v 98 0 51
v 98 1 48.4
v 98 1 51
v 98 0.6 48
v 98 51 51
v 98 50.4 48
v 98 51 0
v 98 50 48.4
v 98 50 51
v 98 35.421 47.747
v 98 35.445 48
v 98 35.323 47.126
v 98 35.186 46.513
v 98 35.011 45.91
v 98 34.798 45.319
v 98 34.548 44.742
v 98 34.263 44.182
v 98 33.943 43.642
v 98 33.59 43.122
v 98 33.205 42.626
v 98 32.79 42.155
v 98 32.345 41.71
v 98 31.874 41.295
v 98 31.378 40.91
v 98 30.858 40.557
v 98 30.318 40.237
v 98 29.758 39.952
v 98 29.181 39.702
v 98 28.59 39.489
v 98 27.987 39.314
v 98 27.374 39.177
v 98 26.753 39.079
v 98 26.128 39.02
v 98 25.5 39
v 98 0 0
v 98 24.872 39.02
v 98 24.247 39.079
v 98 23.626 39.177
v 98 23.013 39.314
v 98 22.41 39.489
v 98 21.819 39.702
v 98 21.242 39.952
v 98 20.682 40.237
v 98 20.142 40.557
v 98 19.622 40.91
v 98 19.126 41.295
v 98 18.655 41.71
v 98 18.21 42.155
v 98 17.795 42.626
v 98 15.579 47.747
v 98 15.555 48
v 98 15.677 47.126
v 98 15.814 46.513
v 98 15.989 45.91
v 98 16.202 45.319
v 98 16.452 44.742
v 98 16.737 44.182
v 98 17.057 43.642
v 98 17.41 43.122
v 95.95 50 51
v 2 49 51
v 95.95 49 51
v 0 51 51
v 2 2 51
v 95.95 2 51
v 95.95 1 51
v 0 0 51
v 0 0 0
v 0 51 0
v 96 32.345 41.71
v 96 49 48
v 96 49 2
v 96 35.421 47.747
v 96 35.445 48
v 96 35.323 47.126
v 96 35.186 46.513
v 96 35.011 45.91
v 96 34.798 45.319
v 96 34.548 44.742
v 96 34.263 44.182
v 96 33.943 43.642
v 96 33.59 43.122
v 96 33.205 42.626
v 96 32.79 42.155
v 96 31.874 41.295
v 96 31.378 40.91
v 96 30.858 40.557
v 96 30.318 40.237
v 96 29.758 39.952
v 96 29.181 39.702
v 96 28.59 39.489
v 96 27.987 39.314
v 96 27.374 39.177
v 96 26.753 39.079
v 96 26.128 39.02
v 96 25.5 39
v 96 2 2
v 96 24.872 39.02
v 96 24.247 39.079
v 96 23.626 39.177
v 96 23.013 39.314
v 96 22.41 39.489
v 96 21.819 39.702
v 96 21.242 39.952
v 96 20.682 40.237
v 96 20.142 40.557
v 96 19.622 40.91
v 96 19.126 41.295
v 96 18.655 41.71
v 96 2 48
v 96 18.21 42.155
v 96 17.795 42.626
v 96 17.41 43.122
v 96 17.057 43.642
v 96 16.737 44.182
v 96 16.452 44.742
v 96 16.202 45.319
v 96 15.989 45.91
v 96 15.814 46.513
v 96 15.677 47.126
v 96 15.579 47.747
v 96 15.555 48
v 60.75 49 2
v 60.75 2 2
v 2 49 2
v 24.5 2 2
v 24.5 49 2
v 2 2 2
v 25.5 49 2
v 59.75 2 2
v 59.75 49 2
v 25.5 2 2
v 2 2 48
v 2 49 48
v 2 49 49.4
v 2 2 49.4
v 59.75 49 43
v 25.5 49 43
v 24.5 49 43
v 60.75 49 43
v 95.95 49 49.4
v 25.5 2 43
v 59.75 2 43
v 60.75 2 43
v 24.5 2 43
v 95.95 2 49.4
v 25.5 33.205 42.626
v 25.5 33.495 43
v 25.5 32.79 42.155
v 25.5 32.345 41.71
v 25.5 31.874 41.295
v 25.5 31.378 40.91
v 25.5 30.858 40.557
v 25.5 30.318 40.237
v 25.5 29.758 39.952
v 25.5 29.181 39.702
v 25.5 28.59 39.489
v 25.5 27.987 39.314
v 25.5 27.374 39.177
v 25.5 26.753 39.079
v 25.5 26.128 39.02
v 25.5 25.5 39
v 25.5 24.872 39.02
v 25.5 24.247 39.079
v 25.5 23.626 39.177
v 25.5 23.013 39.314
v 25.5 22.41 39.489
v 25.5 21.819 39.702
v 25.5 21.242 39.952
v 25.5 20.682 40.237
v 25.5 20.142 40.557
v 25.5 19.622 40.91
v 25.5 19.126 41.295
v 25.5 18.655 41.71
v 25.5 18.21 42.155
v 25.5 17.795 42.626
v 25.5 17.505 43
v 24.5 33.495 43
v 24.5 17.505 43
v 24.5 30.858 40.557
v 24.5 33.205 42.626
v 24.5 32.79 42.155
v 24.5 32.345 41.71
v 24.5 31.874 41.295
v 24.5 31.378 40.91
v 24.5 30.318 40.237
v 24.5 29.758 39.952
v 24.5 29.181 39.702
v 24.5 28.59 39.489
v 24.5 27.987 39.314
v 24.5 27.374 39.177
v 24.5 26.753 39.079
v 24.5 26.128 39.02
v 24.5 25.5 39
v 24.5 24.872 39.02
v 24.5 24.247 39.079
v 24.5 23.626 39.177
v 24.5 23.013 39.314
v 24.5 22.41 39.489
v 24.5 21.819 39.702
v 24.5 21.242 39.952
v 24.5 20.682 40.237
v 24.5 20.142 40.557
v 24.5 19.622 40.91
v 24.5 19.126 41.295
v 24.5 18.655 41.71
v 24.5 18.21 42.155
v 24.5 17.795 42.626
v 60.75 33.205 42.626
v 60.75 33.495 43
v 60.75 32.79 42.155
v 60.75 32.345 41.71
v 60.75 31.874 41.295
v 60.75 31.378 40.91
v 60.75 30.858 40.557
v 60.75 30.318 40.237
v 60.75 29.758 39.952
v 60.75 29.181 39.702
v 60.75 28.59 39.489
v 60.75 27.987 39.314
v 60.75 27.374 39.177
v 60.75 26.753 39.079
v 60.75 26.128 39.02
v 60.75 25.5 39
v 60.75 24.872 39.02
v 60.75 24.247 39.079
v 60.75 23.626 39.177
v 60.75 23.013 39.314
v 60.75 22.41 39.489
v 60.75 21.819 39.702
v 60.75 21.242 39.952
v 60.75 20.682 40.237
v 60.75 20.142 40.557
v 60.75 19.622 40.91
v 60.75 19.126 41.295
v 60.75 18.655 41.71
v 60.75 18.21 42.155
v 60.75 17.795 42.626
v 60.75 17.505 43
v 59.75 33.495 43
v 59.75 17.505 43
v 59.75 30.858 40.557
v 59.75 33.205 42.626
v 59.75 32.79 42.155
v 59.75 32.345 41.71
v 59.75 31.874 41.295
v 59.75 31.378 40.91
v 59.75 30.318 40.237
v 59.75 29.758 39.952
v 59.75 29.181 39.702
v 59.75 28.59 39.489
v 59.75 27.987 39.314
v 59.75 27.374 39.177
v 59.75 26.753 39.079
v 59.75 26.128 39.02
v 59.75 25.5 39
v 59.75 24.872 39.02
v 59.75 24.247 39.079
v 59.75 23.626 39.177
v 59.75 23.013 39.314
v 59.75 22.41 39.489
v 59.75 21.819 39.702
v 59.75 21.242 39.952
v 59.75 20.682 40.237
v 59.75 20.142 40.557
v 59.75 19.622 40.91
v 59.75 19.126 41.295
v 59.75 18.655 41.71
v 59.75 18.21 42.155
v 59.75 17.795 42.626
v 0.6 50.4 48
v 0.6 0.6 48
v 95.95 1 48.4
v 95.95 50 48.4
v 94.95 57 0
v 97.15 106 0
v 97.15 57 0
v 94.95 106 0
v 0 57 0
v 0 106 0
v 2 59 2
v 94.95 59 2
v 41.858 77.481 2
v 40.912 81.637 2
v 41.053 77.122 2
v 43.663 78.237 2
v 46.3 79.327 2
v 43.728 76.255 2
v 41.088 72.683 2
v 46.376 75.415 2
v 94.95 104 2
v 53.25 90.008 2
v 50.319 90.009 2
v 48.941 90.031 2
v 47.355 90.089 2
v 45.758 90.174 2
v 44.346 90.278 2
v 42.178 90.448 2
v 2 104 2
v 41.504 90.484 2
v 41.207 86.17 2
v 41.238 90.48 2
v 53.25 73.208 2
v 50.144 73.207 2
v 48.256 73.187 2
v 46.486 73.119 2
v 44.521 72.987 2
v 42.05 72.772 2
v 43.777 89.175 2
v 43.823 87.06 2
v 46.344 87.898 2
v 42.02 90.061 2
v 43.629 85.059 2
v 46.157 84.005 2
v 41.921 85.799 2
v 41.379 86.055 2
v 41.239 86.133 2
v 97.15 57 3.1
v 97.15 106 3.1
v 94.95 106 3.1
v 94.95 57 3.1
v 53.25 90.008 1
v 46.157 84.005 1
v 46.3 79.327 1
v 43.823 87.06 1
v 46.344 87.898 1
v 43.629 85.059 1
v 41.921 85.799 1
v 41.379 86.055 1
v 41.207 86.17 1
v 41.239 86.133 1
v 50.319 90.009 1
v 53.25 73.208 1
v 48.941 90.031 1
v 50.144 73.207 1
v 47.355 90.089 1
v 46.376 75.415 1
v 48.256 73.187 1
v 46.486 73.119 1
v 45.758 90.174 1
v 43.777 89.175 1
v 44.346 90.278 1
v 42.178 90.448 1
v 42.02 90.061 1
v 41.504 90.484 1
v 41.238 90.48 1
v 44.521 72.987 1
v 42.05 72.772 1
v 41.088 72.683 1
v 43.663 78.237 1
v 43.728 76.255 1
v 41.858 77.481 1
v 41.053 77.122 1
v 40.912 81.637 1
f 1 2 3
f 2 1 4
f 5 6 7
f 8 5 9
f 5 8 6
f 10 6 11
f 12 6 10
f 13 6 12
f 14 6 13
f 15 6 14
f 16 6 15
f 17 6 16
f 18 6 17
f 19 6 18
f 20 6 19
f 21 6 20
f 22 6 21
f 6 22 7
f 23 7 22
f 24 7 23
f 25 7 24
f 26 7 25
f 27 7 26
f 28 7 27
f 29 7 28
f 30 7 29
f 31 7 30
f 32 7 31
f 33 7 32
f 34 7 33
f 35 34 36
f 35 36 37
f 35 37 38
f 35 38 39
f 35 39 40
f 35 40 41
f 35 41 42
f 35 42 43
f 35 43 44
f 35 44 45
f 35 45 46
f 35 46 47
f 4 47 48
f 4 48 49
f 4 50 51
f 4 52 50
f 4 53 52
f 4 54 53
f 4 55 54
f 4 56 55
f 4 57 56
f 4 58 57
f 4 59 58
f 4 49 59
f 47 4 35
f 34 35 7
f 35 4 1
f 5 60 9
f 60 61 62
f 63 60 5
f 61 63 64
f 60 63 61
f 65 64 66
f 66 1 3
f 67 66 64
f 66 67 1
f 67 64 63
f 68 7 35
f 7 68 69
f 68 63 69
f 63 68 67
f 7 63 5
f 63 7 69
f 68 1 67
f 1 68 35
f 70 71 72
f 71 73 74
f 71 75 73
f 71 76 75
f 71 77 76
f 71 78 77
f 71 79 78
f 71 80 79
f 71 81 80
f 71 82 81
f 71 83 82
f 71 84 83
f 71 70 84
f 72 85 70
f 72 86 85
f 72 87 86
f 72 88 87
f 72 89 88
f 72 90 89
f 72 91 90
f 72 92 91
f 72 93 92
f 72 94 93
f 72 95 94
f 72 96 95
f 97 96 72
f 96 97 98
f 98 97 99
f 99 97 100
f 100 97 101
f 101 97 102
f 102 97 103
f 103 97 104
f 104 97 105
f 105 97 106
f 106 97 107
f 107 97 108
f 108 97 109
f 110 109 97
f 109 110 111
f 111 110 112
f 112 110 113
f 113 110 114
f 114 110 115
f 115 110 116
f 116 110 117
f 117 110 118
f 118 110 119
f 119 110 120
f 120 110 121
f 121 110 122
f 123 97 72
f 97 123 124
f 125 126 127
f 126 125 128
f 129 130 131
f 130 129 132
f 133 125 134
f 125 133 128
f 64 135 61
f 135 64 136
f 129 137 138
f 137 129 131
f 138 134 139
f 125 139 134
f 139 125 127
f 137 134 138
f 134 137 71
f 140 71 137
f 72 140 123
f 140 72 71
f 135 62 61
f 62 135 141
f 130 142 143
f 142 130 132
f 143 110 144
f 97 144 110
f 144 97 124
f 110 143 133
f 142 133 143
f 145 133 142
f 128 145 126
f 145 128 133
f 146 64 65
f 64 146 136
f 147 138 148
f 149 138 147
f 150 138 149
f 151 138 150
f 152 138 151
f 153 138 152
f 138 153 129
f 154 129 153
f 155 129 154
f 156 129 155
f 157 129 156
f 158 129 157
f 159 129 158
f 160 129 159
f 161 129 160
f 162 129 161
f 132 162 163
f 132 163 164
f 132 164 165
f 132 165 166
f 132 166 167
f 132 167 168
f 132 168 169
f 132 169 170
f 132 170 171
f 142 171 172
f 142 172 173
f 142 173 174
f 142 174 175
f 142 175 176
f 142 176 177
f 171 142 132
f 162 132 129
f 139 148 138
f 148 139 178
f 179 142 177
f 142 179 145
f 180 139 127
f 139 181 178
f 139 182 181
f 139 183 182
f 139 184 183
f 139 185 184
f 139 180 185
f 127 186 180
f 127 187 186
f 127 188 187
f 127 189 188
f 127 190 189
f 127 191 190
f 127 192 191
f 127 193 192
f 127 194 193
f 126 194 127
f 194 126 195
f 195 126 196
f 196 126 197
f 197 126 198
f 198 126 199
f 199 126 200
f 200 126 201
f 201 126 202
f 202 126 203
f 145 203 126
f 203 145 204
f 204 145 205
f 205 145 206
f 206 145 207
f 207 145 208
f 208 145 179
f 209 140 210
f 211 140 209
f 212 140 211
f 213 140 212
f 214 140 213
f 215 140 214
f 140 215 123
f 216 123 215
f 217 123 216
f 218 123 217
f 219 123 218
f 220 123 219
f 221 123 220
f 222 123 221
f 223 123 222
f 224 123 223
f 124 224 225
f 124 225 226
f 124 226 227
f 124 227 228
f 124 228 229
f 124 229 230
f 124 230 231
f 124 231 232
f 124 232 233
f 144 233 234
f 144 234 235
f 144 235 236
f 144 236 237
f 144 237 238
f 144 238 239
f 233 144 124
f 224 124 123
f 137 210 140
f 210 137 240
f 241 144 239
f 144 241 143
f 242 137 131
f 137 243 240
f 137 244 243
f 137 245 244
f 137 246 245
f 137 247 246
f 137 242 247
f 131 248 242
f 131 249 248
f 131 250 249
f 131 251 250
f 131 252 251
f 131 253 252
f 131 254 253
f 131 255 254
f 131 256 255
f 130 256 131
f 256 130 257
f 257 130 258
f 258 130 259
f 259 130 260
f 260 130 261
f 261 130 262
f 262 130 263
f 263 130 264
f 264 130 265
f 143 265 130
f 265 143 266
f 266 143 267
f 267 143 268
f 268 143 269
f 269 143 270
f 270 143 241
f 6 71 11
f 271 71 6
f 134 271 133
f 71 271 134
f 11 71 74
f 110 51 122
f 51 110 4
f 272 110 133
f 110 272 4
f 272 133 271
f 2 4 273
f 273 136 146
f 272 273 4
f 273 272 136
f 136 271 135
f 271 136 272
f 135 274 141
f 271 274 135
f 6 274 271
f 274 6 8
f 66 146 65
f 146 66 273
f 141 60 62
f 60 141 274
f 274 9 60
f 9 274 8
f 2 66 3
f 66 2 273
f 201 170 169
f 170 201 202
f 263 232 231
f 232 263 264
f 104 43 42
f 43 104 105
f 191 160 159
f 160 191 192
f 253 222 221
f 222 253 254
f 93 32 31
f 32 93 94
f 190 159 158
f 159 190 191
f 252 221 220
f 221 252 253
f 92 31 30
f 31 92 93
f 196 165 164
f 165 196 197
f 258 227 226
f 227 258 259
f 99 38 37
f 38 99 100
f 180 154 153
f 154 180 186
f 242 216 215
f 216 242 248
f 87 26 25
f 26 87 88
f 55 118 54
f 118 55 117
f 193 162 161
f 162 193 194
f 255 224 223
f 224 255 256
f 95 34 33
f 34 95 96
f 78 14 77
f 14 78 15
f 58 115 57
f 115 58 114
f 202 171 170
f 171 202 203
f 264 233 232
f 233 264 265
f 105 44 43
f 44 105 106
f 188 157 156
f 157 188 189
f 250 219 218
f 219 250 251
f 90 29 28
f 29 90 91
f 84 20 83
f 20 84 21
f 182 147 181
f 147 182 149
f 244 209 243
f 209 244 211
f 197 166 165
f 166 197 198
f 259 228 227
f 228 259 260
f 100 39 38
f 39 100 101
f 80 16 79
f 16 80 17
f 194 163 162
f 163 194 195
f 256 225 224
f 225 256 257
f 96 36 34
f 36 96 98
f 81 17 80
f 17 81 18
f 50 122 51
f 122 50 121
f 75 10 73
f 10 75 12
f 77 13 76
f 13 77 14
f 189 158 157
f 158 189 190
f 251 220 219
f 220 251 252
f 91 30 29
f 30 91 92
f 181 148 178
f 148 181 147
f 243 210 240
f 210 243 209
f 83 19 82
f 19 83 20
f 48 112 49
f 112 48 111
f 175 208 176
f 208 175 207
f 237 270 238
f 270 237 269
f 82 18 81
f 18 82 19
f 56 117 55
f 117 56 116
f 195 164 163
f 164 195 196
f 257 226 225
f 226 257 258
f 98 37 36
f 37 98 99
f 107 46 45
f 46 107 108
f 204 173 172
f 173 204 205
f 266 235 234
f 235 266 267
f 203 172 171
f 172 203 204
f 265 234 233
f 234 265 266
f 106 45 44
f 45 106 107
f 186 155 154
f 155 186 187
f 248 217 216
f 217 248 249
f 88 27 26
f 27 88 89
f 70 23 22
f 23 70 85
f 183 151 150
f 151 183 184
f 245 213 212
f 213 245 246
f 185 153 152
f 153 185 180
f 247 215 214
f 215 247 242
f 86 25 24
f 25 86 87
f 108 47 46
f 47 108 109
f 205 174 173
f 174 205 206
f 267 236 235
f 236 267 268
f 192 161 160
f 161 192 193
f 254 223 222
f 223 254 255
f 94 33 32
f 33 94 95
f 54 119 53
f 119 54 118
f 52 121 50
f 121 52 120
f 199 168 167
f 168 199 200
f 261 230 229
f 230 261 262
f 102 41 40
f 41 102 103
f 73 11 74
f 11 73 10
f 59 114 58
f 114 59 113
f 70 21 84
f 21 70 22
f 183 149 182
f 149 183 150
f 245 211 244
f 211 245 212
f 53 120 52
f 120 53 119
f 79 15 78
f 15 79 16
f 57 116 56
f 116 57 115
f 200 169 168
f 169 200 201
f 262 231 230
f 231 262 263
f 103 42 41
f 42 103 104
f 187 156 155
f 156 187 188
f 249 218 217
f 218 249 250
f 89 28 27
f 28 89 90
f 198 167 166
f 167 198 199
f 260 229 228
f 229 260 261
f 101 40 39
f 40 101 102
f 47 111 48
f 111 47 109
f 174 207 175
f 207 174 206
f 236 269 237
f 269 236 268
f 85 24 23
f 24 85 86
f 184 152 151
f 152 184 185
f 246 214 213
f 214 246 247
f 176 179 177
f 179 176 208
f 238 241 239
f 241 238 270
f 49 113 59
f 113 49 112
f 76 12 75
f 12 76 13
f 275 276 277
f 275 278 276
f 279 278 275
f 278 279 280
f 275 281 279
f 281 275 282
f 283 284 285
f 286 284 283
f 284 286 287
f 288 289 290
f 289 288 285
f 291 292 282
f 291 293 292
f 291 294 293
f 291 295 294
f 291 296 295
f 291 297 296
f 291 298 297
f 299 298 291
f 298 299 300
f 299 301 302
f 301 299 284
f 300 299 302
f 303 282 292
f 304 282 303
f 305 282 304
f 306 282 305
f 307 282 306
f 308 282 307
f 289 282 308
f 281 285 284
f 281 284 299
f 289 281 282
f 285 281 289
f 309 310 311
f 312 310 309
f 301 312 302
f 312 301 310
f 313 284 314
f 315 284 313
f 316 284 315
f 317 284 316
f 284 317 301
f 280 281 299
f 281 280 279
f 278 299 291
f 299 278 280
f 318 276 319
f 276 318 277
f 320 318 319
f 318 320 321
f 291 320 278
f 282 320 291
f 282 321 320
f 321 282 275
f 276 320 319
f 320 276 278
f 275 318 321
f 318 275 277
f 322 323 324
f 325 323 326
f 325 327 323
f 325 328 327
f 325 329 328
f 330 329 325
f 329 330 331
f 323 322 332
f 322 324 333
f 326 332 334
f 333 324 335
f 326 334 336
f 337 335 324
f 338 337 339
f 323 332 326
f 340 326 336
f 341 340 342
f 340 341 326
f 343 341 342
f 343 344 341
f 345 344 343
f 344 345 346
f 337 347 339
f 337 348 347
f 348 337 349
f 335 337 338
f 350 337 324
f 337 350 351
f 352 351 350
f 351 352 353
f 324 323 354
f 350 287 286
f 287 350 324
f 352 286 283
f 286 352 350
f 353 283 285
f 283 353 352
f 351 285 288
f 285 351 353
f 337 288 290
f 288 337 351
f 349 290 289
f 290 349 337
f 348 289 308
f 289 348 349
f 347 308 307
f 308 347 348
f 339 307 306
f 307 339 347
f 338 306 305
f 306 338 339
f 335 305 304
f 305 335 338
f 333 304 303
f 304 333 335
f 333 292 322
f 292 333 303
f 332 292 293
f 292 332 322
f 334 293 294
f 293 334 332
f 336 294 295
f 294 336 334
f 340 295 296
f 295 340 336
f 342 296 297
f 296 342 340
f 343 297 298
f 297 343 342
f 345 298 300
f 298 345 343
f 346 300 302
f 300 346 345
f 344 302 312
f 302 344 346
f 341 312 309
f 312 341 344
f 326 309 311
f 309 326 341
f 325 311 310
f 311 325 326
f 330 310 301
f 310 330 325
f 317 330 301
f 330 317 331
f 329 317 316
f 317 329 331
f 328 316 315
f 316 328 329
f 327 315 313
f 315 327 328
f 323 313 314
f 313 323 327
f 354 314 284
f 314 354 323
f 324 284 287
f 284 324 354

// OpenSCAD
// file: carcassonne_box.scad
/**
 * @file carcassonne_box.scad
 * @author Conlan Wesson
 * Template for Carcossonne boxes.
 * @copyright Creative Commons Attribution-NonCommercial-ShareAlike 4.0
 */

mm = 1;
cm = 10*mm;

width = 47*mm;
thick = 2.5*mm;
wall = 2*mm;

/**
 * Lid for box.
 * @param count Number of cards.
 * @param columns Number of columns.
 * @param icon Path to icon DXF file.
 * @param rot Icon rotation in degrees.
 * @param mult Icon scale.
 * @param xoff X-offset of icon from center.
 * @param yoff Y-offset of icon from center.
 */
module carcassonne_lid(count, columns=1, icon=false, rot=0, mult=1, xoff=0, yoff=0, g=0){
	length = (thick * count) + ((width/2) - ((thick * count) % (width/2)));
	w = length+(1.5*wall)+.1;
	l = (width*columns)+wall;
	h = wall;
	d = 2;

	CubePoints = [
		[ 0-g, 0-g,   0 ],  //0
		[ w+g, 0-g,   0 ],  //1
		[ w+g, l+g,   0 ],  //2
		[ 0-g, l+g,   0 ],  //3
		[   d,   d, h+g ],  //4
		[   w,   d, h+g ],  //5
		[   w, l-d, h+g ],  //6
		[   d, l-d, h+g ]   //7
	];
	
	CubeFaces = [
		[0,1,2,3],  // bottom
		[4,5,1,0],  // front
		[7,6,5,4],  // top
		[5,6,2,1],  // right
		[6,7,3,2],  // back
		[7,4,0,3]   // left
	];
	
	
	difference(){
		union(){
			polyhedron( CubePoints, CubeFaces );
			translate([w-wall-.15,0,0]) cube([wall+.2,l, (1.5*wall)+.1]);
		}
		if(icon){
			translate([w/2+xoff,l/3+yoff,h-(wall/2)]){
				linear_extrude(height=(wall)+.1){
					rotate(rot) scale(mult) import(icon);
				}
			}
		}
	}
}

/**
 * Carcassonne card box.
 * @param count Number of cards.
 * @param dividers Array of divider positions.
 * @param columns Number of columns.
 */
module carcassonne_box(count, dividers=[], columns=1){
	length = (thick * count) + ((width/2) - ((thick * count) % (width/2)));
	difference(){
		union(){
			difference(){
				// Outer walls
				cube([length+(2*wall), (width*columns)+(2*wall), width+(2*wall)]);
				// Cavity
				translate([wall, wall, wall]){
					cube([length, width*columns, (width+wall)+.1]);
				}
			}
			// Dividers
			for(col = [0:columns-1]){
				for(div = dividers[col]){
					translate([(div*(width/2))+(wall/2), width*col+wall, 0]) cube([wall/2, width, width-(2*wall)]);
				}
				if(col > 0){
					translate([0, width*col+(wall/2), 0]) cube([length+(2*wall), wall/2, width-(2*wall)]);
				}
			}
		}
		union(){
			// Notch
			for(col = [0:columns-1]){
				translate([wall, wall+(width*col), wall]){
					translate([0, width/2, width])
					rotate([0, 90, 0]){
						cylinder(r=10, h=length+(2*wall), $fn=100);
					}
				}
			}
			// Track
			translate([wall/2,wall/2,width+wall/2]) carcassonne_lid(count, columns, g=0.4);
		}
	}
}
// main file
/**
 * @file countkingrobber.scad
 * @author Conlan Wesson
 * Count, King, and Robber Carcossonne box.
 * @copyright Creative Commons Attribution-NonCommercial-ShareAlike 4.0
 */

include <carcassonne_box.scad>

count = 30;
dividers = [[1,2.5]];
columns = 1;

carcassonne_box(count, dividers, columns);
translate([0,width*columns+10,0]) carcassonne_lid(count, columns, icon="countkingrobber.dxf", rot=-90, mult=0.175, xoff=-10, yoff=20);
